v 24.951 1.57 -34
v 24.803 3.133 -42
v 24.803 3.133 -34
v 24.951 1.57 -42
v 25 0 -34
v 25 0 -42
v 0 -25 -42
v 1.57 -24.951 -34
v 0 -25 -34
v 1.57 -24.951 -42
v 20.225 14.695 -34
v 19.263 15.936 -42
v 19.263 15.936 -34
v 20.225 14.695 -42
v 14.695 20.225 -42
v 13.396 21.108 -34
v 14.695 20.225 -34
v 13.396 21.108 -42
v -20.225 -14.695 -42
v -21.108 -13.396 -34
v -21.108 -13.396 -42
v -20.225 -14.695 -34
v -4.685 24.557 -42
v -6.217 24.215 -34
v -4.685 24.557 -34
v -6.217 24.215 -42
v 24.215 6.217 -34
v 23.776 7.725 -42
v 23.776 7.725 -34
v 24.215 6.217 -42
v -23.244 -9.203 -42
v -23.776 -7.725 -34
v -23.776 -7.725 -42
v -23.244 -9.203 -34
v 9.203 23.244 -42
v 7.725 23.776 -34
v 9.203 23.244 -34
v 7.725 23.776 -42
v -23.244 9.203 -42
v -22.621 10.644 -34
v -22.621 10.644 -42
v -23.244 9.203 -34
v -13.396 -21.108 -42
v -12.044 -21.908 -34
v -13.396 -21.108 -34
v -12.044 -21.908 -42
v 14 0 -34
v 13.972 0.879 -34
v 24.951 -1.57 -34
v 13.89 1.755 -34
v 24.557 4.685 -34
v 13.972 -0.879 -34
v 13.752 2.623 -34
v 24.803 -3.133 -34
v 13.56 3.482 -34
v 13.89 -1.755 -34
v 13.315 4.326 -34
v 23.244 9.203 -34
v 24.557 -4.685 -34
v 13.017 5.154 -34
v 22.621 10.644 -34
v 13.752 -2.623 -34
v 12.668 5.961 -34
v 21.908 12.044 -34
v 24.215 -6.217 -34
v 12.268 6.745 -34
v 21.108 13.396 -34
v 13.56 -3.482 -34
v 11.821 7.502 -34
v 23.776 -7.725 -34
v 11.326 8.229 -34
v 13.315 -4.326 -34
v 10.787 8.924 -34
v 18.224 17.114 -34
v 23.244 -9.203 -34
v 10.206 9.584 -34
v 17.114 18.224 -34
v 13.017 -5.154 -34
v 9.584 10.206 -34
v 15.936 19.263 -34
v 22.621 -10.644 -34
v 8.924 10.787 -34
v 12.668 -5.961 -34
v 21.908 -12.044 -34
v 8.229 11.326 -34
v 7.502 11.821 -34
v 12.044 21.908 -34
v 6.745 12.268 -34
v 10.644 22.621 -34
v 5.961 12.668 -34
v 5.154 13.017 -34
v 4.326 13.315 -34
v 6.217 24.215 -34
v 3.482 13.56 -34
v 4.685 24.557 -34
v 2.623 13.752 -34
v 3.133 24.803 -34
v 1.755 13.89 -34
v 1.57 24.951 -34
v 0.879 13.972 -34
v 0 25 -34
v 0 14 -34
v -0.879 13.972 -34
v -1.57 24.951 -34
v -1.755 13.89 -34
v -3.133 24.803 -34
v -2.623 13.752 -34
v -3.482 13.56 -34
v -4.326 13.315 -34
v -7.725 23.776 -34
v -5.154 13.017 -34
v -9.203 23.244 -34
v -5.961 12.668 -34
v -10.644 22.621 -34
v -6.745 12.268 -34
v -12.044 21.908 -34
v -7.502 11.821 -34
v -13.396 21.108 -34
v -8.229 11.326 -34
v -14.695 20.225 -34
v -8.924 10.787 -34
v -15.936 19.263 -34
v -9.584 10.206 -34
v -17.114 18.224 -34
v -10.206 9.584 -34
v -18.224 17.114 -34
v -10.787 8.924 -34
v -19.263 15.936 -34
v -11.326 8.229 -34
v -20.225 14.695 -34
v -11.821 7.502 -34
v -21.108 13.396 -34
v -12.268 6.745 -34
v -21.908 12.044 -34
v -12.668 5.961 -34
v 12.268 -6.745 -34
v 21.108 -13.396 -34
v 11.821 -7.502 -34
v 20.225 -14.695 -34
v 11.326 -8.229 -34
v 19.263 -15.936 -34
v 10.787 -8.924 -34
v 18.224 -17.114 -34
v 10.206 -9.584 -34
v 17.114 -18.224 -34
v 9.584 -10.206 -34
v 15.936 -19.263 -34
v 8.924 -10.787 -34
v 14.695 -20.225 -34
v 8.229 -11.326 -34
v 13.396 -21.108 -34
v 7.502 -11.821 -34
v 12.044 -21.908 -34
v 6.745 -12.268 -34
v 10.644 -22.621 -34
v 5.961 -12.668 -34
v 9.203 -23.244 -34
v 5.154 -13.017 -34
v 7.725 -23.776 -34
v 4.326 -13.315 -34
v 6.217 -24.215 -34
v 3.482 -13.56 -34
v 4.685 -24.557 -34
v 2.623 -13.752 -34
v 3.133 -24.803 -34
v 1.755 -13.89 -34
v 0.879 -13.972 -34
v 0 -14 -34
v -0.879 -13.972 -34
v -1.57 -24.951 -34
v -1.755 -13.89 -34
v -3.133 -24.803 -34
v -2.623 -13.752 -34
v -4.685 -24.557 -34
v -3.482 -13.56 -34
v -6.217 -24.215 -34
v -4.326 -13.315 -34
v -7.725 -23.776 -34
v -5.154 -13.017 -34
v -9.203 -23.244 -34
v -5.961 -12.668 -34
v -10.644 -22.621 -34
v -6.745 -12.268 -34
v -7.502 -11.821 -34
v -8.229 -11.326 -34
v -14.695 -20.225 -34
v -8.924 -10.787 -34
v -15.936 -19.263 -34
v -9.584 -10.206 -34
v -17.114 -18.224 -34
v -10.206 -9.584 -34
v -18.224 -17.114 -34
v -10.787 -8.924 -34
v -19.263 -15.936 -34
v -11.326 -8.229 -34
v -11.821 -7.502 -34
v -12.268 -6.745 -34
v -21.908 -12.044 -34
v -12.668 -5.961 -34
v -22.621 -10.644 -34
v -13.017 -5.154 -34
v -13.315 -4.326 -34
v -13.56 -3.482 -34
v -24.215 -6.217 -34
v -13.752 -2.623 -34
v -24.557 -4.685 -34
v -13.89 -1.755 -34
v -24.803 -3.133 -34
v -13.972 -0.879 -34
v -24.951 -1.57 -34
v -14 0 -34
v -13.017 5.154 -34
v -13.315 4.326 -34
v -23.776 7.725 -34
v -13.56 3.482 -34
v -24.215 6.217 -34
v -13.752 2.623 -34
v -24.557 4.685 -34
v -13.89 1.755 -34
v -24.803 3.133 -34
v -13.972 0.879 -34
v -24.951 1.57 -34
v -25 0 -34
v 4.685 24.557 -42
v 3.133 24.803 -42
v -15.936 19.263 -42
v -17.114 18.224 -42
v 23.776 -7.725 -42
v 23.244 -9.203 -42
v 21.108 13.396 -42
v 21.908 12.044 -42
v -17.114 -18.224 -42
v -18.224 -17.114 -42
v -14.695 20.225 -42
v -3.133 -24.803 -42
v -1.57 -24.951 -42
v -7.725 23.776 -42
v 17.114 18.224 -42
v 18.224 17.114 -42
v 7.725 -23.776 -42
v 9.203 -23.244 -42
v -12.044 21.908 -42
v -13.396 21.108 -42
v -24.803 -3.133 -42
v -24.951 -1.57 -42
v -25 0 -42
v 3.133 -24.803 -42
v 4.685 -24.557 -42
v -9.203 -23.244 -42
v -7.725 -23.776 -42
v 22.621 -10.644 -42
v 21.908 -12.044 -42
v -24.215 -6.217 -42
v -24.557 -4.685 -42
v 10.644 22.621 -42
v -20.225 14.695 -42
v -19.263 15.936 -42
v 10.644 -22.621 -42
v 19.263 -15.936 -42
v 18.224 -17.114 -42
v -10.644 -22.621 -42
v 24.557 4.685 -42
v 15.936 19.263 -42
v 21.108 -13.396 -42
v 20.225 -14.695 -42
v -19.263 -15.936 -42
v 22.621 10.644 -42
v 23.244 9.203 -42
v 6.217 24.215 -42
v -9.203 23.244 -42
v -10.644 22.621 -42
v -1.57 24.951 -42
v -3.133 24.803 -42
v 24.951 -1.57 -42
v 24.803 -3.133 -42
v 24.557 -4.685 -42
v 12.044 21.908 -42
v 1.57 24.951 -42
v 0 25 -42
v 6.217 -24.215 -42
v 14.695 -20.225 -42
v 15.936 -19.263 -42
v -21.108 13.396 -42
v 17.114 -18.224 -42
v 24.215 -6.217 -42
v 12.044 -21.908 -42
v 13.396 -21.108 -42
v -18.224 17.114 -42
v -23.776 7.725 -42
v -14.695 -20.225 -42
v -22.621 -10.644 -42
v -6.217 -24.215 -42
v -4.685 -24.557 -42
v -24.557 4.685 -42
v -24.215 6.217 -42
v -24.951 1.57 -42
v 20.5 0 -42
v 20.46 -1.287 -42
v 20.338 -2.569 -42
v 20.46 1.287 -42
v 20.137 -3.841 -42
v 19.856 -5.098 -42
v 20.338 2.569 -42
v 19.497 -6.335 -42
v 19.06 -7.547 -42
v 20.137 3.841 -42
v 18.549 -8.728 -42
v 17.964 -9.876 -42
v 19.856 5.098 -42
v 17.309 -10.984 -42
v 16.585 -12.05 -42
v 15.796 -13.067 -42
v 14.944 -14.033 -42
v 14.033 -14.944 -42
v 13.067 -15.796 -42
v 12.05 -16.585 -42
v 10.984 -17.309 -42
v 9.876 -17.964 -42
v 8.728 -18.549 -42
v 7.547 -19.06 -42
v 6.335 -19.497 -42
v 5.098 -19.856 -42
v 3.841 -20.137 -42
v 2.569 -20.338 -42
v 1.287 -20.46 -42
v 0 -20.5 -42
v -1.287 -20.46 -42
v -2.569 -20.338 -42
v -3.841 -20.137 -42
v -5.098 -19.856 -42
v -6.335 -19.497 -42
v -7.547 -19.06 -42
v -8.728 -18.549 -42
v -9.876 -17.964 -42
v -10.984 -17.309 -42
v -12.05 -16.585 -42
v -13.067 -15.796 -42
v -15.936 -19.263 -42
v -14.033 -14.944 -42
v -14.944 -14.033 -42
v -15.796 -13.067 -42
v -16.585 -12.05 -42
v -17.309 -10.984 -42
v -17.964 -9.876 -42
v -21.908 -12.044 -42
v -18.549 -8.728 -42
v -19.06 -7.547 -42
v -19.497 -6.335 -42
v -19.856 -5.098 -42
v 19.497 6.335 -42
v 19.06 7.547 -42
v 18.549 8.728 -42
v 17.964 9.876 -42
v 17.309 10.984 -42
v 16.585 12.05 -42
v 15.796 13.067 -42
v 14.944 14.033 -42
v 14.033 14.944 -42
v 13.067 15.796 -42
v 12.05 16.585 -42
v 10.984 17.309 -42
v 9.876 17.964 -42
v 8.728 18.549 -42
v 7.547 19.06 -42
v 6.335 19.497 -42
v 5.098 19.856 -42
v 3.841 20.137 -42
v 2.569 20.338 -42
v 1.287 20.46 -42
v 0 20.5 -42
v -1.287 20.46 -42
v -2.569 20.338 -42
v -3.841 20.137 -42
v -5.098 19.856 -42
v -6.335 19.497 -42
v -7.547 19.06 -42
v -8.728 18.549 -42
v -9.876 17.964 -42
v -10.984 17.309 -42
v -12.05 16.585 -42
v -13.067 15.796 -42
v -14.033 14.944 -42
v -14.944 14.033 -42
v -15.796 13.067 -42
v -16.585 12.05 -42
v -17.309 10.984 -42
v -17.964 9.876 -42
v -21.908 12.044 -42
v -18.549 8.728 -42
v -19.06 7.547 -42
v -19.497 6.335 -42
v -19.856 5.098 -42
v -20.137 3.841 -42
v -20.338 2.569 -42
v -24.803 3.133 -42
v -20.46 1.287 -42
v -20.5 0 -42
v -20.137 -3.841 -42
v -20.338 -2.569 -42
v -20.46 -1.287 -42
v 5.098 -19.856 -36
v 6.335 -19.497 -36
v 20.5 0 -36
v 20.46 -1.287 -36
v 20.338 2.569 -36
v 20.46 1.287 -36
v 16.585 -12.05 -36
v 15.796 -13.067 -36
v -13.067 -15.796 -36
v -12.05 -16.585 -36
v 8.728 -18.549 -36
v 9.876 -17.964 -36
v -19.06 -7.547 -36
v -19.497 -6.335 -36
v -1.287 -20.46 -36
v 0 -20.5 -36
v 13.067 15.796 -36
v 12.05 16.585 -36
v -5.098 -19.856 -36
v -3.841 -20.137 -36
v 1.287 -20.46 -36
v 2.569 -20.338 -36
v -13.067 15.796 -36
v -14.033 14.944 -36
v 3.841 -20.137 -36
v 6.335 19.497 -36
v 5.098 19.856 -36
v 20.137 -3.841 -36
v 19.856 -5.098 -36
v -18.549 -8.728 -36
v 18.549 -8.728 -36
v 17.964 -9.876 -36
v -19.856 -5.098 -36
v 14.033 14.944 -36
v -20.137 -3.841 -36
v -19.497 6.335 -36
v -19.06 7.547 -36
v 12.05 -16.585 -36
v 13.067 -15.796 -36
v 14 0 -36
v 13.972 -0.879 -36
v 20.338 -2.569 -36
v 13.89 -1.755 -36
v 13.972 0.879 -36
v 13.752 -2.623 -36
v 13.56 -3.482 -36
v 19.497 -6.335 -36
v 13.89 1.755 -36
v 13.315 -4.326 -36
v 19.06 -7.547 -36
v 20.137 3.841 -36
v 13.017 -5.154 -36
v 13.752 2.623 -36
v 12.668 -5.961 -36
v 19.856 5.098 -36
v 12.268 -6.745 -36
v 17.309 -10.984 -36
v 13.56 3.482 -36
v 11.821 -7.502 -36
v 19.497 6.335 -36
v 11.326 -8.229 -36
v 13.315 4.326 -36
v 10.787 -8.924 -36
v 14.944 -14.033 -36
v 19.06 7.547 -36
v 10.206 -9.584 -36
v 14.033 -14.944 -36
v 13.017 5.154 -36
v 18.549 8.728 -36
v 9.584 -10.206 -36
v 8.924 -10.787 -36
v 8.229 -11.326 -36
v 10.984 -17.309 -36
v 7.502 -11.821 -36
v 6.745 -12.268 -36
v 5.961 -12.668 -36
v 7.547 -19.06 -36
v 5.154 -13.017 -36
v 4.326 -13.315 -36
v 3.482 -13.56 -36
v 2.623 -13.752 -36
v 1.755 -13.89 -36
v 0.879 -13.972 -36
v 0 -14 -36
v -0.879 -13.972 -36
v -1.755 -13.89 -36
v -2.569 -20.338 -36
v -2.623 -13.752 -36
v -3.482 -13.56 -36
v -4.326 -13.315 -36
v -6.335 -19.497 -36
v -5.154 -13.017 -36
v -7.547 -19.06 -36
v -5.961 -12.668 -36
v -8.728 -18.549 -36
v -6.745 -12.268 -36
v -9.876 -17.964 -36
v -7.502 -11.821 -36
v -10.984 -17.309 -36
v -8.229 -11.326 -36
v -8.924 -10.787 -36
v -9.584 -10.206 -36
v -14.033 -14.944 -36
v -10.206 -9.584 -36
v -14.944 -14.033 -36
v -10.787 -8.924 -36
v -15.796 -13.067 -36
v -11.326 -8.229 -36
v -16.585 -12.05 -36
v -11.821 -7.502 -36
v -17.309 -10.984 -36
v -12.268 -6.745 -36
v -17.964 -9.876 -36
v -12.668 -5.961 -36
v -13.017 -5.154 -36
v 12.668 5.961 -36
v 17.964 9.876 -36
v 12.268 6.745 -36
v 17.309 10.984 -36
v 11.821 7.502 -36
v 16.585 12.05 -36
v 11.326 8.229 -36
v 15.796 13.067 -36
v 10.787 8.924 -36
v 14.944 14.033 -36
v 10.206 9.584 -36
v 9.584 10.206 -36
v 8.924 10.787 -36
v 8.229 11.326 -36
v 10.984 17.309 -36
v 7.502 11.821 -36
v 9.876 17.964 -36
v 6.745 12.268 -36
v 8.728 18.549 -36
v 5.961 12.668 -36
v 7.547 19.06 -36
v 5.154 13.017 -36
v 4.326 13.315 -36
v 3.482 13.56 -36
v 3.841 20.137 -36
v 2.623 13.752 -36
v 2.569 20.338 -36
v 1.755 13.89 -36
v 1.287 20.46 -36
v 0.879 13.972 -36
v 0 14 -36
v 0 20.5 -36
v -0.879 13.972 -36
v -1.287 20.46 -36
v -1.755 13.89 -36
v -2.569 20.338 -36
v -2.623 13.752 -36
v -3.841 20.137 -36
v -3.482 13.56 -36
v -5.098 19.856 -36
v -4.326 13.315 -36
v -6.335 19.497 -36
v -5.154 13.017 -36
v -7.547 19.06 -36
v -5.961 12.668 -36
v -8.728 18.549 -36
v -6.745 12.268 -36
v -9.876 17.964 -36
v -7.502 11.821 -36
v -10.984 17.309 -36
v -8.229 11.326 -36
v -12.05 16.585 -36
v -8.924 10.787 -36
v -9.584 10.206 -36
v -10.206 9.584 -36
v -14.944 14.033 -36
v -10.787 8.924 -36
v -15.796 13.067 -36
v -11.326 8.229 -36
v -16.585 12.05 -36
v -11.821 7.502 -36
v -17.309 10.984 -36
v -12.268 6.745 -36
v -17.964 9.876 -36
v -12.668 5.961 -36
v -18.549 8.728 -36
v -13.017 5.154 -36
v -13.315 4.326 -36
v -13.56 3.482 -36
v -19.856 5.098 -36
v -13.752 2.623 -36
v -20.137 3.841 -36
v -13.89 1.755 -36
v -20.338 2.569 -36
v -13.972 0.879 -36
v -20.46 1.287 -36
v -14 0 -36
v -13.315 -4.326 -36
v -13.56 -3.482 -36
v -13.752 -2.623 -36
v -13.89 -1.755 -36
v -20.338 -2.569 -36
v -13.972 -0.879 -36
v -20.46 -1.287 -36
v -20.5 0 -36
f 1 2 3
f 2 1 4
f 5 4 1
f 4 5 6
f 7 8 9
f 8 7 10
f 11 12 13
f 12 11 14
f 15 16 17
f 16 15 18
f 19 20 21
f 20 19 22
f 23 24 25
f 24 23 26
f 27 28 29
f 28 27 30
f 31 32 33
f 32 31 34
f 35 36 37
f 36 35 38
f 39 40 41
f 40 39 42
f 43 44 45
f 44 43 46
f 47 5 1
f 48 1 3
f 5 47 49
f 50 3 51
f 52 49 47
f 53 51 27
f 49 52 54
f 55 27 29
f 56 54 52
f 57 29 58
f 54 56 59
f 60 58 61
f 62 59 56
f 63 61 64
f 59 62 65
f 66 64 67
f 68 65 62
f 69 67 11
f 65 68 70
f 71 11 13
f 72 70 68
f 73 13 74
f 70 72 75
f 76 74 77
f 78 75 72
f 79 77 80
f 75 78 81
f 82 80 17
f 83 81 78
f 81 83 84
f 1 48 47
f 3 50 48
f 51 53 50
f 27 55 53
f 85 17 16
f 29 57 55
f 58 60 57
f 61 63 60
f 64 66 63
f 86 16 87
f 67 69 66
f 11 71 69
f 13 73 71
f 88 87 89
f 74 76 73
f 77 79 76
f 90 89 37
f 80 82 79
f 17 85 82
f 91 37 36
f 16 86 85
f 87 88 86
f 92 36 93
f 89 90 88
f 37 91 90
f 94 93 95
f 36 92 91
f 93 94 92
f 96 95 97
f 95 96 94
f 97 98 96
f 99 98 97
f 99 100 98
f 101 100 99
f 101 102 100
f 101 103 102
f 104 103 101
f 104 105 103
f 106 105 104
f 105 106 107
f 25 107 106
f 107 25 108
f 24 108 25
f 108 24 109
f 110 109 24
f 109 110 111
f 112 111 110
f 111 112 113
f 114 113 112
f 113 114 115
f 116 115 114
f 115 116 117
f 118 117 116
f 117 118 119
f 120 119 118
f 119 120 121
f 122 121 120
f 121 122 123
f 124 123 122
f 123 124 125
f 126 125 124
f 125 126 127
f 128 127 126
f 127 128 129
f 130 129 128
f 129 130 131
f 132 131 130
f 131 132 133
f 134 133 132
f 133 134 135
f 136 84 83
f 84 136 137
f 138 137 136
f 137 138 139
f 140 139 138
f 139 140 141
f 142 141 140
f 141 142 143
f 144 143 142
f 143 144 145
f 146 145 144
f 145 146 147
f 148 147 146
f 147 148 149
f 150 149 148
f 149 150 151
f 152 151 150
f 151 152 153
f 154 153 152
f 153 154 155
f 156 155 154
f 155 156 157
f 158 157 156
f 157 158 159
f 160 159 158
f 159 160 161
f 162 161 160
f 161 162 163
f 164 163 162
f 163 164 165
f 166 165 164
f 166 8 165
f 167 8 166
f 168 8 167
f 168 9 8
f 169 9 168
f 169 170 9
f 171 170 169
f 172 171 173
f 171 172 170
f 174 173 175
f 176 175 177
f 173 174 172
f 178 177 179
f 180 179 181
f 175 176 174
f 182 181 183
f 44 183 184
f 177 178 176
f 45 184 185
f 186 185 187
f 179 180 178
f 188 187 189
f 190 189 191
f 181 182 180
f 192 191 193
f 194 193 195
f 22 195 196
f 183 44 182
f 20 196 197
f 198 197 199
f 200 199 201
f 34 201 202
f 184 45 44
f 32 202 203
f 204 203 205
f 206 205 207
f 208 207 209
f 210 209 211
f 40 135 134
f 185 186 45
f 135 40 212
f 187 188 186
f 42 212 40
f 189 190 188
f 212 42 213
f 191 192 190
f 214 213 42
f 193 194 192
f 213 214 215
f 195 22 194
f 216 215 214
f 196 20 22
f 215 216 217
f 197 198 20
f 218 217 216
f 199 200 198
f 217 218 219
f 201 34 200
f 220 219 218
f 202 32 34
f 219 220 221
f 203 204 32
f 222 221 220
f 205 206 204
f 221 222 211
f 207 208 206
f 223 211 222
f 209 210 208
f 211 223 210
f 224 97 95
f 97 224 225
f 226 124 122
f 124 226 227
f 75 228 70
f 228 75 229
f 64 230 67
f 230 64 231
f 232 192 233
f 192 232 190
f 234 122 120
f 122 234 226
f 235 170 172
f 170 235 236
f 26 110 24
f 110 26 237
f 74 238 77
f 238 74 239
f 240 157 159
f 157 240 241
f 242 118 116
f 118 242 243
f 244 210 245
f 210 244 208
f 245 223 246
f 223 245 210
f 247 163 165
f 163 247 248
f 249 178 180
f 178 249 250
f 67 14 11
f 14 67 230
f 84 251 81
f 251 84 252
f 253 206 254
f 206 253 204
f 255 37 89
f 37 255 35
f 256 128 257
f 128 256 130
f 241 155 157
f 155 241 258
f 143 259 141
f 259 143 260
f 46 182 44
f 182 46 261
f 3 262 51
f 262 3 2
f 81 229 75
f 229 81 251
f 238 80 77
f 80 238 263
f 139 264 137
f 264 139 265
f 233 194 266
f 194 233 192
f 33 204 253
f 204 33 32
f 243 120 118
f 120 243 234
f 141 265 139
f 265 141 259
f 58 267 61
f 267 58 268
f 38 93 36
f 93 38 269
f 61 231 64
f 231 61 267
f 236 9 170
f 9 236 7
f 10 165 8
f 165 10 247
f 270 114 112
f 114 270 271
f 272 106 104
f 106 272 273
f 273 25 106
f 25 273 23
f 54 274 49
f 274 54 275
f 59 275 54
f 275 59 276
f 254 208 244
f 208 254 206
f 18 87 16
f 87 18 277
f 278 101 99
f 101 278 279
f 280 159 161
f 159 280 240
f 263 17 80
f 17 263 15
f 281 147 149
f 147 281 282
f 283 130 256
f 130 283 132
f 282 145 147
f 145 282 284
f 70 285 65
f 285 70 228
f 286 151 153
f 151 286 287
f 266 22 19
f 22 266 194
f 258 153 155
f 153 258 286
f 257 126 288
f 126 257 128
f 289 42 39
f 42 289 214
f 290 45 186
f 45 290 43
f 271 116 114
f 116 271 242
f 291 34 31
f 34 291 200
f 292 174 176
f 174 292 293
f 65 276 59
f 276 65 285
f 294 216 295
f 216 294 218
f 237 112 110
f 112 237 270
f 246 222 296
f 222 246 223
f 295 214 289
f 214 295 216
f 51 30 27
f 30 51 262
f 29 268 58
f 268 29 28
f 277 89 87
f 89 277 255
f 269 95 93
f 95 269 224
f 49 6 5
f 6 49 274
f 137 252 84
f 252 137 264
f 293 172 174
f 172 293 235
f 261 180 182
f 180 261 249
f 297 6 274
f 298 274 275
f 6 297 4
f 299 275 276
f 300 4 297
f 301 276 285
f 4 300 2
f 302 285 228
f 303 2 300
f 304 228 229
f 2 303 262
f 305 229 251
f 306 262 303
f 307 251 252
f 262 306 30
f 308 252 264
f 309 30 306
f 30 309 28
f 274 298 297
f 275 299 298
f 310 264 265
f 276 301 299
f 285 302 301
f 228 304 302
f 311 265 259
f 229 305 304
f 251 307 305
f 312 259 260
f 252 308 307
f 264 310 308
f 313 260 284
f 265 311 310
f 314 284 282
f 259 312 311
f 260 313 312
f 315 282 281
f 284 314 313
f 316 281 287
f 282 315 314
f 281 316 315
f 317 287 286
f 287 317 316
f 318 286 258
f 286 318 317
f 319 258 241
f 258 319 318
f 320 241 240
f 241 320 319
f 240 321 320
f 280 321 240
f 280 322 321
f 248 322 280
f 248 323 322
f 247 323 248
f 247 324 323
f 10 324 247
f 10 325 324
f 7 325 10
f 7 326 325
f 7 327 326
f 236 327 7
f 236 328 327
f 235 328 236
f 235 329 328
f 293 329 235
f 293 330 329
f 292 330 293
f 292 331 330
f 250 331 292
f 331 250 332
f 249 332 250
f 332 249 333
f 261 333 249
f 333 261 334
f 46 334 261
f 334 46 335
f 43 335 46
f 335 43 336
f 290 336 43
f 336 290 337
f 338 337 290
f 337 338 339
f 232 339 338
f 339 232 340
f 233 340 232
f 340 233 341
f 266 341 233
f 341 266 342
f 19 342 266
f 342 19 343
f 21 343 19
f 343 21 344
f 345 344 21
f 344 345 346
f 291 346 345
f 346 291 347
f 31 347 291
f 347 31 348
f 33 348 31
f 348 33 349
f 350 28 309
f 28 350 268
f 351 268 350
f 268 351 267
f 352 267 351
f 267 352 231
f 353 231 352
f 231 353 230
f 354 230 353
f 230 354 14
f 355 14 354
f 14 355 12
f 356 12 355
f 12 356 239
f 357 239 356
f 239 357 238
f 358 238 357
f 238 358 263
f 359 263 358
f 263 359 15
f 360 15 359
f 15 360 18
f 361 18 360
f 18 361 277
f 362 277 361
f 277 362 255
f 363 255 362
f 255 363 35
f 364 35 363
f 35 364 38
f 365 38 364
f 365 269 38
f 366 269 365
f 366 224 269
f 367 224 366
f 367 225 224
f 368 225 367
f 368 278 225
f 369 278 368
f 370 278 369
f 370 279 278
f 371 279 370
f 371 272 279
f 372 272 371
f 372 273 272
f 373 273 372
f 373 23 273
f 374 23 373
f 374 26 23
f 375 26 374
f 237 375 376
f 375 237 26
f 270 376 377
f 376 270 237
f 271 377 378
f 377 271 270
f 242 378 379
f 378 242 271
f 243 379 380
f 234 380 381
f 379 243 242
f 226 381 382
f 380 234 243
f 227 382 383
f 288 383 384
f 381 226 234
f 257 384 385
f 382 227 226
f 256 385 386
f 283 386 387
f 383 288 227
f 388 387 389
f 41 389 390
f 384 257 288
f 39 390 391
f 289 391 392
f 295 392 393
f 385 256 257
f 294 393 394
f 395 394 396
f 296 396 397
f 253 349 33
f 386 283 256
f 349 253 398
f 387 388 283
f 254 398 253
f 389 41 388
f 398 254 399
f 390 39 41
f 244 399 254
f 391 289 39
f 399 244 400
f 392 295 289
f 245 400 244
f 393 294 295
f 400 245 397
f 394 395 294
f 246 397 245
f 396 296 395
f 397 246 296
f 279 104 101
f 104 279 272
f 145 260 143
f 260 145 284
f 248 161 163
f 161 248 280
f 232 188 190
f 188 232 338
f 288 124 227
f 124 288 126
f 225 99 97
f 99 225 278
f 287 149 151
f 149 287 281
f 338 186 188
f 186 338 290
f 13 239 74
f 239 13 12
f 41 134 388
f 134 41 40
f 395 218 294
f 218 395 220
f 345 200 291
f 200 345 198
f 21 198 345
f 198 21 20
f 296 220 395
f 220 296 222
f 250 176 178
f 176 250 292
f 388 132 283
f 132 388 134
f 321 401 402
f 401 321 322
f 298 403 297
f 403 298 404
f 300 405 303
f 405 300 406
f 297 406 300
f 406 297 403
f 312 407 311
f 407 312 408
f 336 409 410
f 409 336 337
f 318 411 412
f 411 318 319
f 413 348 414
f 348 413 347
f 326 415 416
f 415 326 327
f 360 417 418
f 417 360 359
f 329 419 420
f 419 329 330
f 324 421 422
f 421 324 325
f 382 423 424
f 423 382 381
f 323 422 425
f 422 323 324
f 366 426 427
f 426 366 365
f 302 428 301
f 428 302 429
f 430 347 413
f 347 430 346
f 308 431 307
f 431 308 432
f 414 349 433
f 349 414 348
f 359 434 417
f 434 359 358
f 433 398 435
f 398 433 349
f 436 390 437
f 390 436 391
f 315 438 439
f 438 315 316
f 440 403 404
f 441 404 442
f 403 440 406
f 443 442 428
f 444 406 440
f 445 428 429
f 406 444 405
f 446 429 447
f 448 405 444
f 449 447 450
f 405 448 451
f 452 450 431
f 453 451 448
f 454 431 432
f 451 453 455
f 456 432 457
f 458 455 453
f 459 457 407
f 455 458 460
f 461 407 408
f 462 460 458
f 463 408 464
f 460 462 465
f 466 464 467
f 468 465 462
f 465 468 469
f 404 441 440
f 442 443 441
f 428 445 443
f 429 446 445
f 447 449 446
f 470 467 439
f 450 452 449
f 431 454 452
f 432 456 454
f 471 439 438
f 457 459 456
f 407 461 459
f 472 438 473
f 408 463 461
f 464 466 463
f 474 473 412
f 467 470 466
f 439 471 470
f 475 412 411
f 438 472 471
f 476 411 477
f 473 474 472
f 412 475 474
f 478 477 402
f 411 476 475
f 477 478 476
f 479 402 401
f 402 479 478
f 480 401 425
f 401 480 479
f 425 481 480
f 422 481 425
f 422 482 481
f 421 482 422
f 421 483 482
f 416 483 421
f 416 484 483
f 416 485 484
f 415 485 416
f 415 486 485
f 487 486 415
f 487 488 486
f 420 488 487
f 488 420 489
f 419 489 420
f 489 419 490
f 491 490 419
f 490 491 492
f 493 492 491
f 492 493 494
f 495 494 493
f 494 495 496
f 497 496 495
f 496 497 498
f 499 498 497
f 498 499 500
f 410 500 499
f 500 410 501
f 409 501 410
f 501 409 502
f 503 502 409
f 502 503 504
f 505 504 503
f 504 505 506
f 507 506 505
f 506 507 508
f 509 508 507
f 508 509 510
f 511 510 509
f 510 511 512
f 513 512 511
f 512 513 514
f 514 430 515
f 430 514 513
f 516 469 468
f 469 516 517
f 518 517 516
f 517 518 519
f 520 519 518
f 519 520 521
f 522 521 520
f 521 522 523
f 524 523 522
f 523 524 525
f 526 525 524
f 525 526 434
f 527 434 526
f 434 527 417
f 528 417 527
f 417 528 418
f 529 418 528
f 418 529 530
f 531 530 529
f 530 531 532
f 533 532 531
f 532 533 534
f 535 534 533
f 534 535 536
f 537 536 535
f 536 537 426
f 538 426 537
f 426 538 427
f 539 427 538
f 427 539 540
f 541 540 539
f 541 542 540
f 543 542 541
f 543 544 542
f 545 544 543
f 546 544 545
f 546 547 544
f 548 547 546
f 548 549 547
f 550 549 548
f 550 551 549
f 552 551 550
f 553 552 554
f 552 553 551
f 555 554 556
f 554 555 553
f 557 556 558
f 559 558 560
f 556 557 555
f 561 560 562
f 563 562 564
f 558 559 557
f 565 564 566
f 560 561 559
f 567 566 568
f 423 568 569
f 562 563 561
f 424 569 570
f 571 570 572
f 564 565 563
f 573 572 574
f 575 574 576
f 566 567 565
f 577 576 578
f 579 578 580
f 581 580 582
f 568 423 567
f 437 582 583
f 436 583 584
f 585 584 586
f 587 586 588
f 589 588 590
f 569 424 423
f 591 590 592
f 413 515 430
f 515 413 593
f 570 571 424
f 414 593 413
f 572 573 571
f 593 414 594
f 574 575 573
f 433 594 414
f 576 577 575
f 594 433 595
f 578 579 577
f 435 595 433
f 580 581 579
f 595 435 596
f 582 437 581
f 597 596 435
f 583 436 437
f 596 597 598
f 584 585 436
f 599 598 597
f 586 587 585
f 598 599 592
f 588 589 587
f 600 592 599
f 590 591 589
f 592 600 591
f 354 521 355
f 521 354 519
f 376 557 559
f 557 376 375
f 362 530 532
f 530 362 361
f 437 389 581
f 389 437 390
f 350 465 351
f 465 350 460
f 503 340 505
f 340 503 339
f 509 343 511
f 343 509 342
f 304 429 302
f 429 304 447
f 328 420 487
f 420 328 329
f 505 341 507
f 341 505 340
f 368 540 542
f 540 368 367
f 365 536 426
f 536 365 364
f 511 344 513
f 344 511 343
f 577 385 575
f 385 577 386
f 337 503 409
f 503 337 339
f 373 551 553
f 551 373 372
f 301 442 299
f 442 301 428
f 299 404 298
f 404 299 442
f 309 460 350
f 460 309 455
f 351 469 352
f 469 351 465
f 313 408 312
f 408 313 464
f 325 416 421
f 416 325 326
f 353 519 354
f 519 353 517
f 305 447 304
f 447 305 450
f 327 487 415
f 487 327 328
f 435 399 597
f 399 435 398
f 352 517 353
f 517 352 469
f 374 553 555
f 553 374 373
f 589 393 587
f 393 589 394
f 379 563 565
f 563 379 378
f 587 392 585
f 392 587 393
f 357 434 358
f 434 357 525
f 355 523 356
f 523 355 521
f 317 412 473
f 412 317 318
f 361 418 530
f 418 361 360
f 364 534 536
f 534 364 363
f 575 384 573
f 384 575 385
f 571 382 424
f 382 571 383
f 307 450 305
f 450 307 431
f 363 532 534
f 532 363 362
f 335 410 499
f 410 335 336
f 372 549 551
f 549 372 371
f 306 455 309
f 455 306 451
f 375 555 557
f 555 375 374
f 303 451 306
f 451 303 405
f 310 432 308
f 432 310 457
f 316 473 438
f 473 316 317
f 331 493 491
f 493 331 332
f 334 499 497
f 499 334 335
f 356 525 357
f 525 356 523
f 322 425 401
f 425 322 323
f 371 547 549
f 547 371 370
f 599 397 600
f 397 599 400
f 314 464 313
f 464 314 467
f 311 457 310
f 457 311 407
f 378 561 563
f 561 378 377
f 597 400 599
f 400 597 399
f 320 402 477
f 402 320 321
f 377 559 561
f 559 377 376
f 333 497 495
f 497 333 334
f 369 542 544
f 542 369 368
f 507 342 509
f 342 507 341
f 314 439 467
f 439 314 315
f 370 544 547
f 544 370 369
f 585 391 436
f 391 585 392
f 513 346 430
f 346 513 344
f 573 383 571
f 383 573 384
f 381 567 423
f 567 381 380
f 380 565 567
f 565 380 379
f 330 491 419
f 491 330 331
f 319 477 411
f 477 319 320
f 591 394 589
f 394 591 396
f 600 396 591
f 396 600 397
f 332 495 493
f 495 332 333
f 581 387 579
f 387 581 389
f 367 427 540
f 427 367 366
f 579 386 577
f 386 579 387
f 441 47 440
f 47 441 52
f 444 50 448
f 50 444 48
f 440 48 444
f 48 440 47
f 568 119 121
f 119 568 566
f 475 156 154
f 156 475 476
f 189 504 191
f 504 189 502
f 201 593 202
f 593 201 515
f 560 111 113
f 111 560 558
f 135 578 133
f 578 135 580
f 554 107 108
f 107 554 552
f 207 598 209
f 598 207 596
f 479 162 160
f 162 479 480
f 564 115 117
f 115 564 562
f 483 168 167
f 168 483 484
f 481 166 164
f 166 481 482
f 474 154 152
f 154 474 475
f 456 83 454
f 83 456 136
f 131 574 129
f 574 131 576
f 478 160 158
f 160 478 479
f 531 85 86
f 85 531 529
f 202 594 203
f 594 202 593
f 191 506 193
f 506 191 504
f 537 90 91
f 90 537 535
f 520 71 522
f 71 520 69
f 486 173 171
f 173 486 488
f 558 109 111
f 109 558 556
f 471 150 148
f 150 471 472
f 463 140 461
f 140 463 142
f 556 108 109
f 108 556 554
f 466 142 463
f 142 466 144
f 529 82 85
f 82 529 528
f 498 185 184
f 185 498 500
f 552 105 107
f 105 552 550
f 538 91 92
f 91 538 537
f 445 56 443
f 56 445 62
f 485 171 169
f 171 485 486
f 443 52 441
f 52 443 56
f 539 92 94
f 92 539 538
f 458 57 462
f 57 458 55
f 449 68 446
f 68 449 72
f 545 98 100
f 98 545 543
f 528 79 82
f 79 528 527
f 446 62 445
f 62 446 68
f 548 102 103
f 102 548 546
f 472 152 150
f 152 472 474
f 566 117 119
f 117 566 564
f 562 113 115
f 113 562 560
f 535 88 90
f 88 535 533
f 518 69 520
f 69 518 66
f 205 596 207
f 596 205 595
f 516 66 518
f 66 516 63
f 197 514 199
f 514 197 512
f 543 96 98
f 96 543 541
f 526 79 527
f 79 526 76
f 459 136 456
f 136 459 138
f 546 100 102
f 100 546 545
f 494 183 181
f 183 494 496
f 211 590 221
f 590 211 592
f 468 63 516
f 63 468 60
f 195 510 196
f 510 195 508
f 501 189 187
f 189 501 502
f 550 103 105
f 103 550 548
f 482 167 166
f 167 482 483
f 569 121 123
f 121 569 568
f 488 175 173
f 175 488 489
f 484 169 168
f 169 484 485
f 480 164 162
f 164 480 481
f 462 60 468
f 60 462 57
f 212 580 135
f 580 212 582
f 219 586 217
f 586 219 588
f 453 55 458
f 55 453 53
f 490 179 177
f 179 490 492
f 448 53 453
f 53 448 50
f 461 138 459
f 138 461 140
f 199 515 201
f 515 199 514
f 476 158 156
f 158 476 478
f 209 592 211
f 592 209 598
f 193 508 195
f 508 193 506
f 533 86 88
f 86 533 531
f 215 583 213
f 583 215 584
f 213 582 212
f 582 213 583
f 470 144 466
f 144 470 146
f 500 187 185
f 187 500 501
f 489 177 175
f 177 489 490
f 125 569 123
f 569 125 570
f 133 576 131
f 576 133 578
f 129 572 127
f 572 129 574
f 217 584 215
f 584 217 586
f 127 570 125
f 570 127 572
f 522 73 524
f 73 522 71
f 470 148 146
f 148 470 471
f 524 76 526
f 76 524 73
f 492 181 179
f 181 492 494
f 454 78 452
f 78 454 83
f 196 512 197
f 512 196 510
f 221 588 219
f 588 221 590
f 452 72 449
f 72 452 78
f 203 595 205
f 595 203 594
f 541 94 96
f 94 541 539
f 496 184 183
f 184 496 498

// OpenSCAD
//Fixings
M5=5.5;
M4=4.5;
M3=3.5;
M2=2.5;
M3INSERT=3.7;
M2INSERT=3.4;


//Blade
BladeDiam=23;//24;
BladeDiamTrue=19.5;
BladeLen=100; //Debug only
BladeThick=3;

CapCollar=2;

//Pico
PicoWid=21;
PicoLen=64;
PicoDep=19;

//PIZ
PIZWid=34;
PIZLen=72;
PIZDep=19;
PCBGrid=2.54;

//Stem
StemLen=50;
StemCollar=0;//5;
StemSegLen=6;
StemSegMaxDiam=50;
StemSegStep=6;

//Grip
GripLen=160; //Max print size is 170
GripDiam=40;//45;
GripOverlap=12;

//Pummel
PummelDiam=GripDiam+10;
PummelIntDiam = GripDiam + 1;
PummelLen=20;
PummelOverlap=5;
PowerWid=11.5;
PowerLen=9;


//PCB
PCBWidth=30.5;
PCBLen=135;
PCBBRy=3.9;
PCBBRx=7.35;
PCBBLx=16.51;//15.51;
PCBBLy=9.4;
PCBTRx=0;
PCBTRy=90.79;
PCBLEDy=12.5;
PCBLEDx=10;
PCBLEDz=5;
PCBSwitchD=5 ;
PCBSwitchY=23.5;
PCBSwitchX=7.6;
PCBSwitchZ=15;//12;
PCBSwitchL=20;
PCBCapX=12;
PCBCapY=114;
PCBCapL=20;
PCBCapZ=PCBCapL/2;
PCBCapD=10.2;
PCBOffz=10;
PCBOffy=-10;



THICK=2;

$fn=100;


/*
Blade();
Pico();
PIZ();
*/
//Blade();
//PCB();
//PIR();

    
//BladeCap();

//Stem();
//GripBack();
//PummelInt();
//Pummel();
//translate([5,10,0]) GripFront();
//GripFront();

//Guard();
GuardShort();

//MountBottom();
//MountTop();



//Test print
/*
difference(){
    GripBack();
    translate([0,0,GripLen*(-0.85)])
        cube([PummelDiam, PummelDiam, GripLen], center=true);
}
*/




module Blade(){
    color("blue")
    translate([0,0,BladeLen/2]){
        difference(){
            cylinder(d=BladeDiam, h=BladeLen, center=true);
            cylinder(d=BladeDiam-(BladeThick*2), h=BladeLen+10, center=true);
        }
        
    }
}

module BladeCap(){
    inner = BladeDiamTrue-(BladeThick);
    translate([0,0,BladeLen]){
        //Half hollow Sphere
        difference(){
            sphere(d=BladeDiamTrue, $fn=100);
            sphere(d=inner);
            translate([0,0,BladeDiamTrue/(-2)]){
                cube([BladeDiamTrue+10, BladeDiamTrue+10, BladeDiamTrue], center=true);
            }
            
            
           for (x=[0:30:360]){
               rotate([0,0,x]){
                   rotate([0,65,0])
                      cylinder(d=M3, h=BladeThick*10, center=true);
               }
           }
  
            
        }
        //Connection collar
        /*
        difference(){
            cylinder(d=inner, h=CapCollar*2, center=true);
            cylinder(d=inner-(THICK*2), h=CapCollar*4, center=true);
        }
        */
    }
}

module Stem(){
    //Inner Tube
    translate([0,0,StemLen/(-2)]){
        difference(){
            cylinder(d=BladeDiam+(THICK*2), h=StemLen, center=true);
            cylinder(d=BladeDiam-(THICK), h=StemLen+10, center=true);
            translate([0,0,(StemLen/2)-(StemCollar/2)]){
                cylinder(d=BladeDiam, h=StemCollar, center=true);
            }
            
            //Coupline
            CoupZ=StemLen/(-2) + (GripOverlap/2);
            translate([0, 0, CoupZ]){
                //Hole
                rotate([90,0,0]){
                    cylinder(d=M2, h=BladeDiam+(THICK*4), center=true);
                }
                //Loose top
                translate([0, (BladeDiam+(THICK*2))/2, THICK*(-1)]){
                    //cube([BladeDiam+(THICK*2), BladeDiam+(THICK*2), GripOverlap-THICK], center=true);
                    cube([BladeDiam/2, BladeDiam+(THICK*2), GripOverlap-THICK], center=true);
                }
            }
        }
    }
    //Steps
    difference(){
        translate([0,0,StemSegLen/2]){
            for(i=[0:4]){
                translate([0, 0, (StemSegLen*(i+1))/(-1)]){
                    cylinder(d=StemSegMaxDiam-(StemSegStep*i), h=StemSegLen, center=true);
                }
            }
        }
        //Hole
        translate([0,0,StemLen/(-2)]){
            cylinder(d=BladeDiam, h=StemLen+10, center=true);
        }   
    }
}

function picoZ()=(StemLen + ((PicoLen+(THICK*4)) / (2)))* (-1) ;

module Pico(){
    z=picoZ();
    translate([0,0,z]){
        color("lightgrey"){
            cube([PicoWid, PicoDep, PicoLen], center=true);
        }
    }
}

module PIZ(){
    z=picoZ() - PIZLen ;
    translate([0,0,z]){
        color("lightGreen"){
            cube([PIZWid, PIZDep, PIZLen], center=true);
        }
    }
}


module GripBack(){
    difference(){
        GripTube();
        rotate([0,0,-30]){
            translate([0,GripDiam/2, gripTubeZ()-THICK]){
                cube([GripDiam+10,GripDiam,GripLen ], center=true);
            }
        }
    }
    stemCoupling();
}

module GripFront(){
    intersection(){
        difference(){
            GripTube();
            translate([0,0,gripTubeZ()]){
                cylinder(d=GripDiam - (THICK*2), h=GripLen+10, center=true);
            }
            rotate([0, 0, -30]){
                translate([0,GripDiam/(-2), gripTubeZ()]){
                    cube([GripDiam+10,GripDiam,GripLen+10 ], center=true);
                }
            }
            
            /*
            //Switch hole
            translate([0,PCBOffy,gripTubeZ()]){
                for(i=[-2:1:2]){
                    translate([PCBWidth/-2, PCBSwitchZ + i, PCBLen/-2-5.5+PCBSwitchY]){
                        rotate([0,90,0]){
                            cylinder(d=PCBSwitchD+1,h=20,center=true);
                        }
                    }
                }
            }
            */
        }
        
        rotate([0, 0, -30]){
            translate([0,GripDiam/2, gripTubeZ()-THICK]){
                cube([GripDiam+10,GripDiam,GripLen ], center=true);
            }
        }
    }
}
    
function gripTubeZ() = (StemLen + GripLen/2 - GripOverlap) *( -1);
module GripTube(){
    z=gripTubeZ();
    translate([0,0,z]){
        difference(){
            cylinder(d=GripDiam, h=GripLen, center=true);
            translate([0,0,THICK*(-1)]){
                cylinder(d=GripDiam - (THICK*2), h=GripLen, center=true);
            }
            //Stem Hole
            cylinder(d=BladeDiam+(THICK*2.5), h=GripLen+10, center=true);
            
            //LED hole
            translate([PCBWidth/-2, PCBLEDz*(-1), PCBLen/-2-9.5+PCBLEDy]){
                rotate([0,90,0]){
                    cylinder(d=3,h=20,center=true);
                }
            }
            
            //Switch hole
            translate([PCBWidth/-2, PCBSwitchZ+PCBOffy, PCBLen/-2-7+PCBSwitchY]){
                for(i=[-2:1:2]){
                    translate([0, i, 0]){
                        rotate([0,90,0]){
                            cylinder(d=PCBSwitchD+1.5,h=20,center=true);
                        }
                    }
                }
            }
            
            //PowerHole
            translate([PCBWidth/-2, -4.5, PCBLen/2-5]){
                translate([-5, 0, PowerSocketY*(-1)]){
                    rotate([90,0,0])
                        PowerSocketHole();
                }
            }
        }
    }
    
    stemCoupling();
    
    
    //PCB Mount
    translate([0,0,z-(GripOverlap/2)]){
        difference(){
            //PCB plate
            cylinder(d=GripDiam, h=GripLen-(GripOverlap), center=true);
            cube([GripDiam, PIZDep, GripLen], center=true);
            translate([0,GripDiam/2,0]){
                cube([GripDiam+10, GripDiam, GripLen+10], center=true);
            }
            translate([0,0,PCBLen/(-2)-5]){
                cube([GripDiam, GripDiam, 10], center=true);
            }
            
            //Mounting Holes
            translate([PCBWidth/-2,0, PCBLen/-2-1.5]){
                translate([PCBBRx,0,PCBBRy]){
                    rotate([90,0,0]){
                        cylinder(d=M2INSERT, h=BladeDiam+(THICK*4), center=true);
                    }
                    translate([PCBBLx,0, PCBBLy]){
                        rotate([90,0,0]){
                            cylinder(d=M2INSERT, h=BladeDiam+(THICK*4), center=true);
                        }
                    }
                    translate([PCBTRx,0, PCBTRy]){
                       rotate([90,0,0]){
                            cylinder(d=M2INSERT, h=BladeDiam+(THICK*4), center=true);
                        }
                    }
                }
            }
            
            
            /*
            //PCB Weight Holes
            pcbCountX=GripDiam/PCBGrid/2-2;
            pcbCountY=(GripLen-GripOverlap)/PCBGrid/2;
            for (y=[0:5:pcbCountY]){
                for (j=[-1,1]){
                    translate([0, 0, y*j*PCBGrid]){
                        for (x=[0:3:pcbCountX]){
                            for (i=[-1,1]){
                                translate([x*i*PCBGrid,0,0]){
                                    rotate([90,0,0]){
                                        cylinder(d=M2INSERT, h=BladeDiam+(THICK*4), center=true);
                                    }
                                }
                            }
                        }
                    }
                }
            }
            */
            
        }
    }
}


module stemCoupling(){
    //Coupling for Stem
    translate([0,0,gripTubeZ() + GripLen/2 - GripOverlap/2]){
        difference(){
            cylinder(d=BladeDiam+(THICK*6.5), h=GripOverlap, center=true);
            cylinder(d=BladeDiam+(THICK*2.5), h=GripOverlap+10, center=true);
            //Bottom half only
            //translate([0,BladeDiam/2,0]){
            //    cube([BladeDiam+(THICK*10),BladeDiam+(THICK*4),GripOverlap+10], center=true);
            //}
            
            //Fixing
            rotate([90,0,0]){
                cylinder(d=M2INSERT, h=BladeDiam+(THICK*4), center=true);
            }
            
            //Opening
            translate([0,BladeDiam,0]){
                cube([BladeDiam/2,BladeDiam,BladeDiam], center=true);
            }
        }
    }
}


module Pummel(){
    z=gripTubeZ()-GripLen/2 - PummelLen/2 + PummelOverlap;
    translate([0,0,z]){
        difference(){
            cylinder(d=PummelDiam, h=PummelLen, center=true);
            translate([0,0,THICK]){
                difference(){
                    cylinder(d=PummelIntDiam, h=PummelLen, center=true);
                    translate([0,0,THICK * (-1.5)])
                        cylinder(d=THICK*3, h=PummelLen - THICK *3, center=true);
                }

            }
            cylinder(d=M2, h=PummelLen*2, center=true);
            
            //PIR
            translate([PIRX,PummelDiam/2-3,0]){
                sphere(d=PIRD+0.3);
                translate([0,THICK*(-3),0])
                    rotate([90,0,0]){
                        cylinder(d=PIRD+0.3, h=THICK*6, center=true);
                    }
            }
        }
    }
}







module PCB(){
    translate([0,PCBOffy, (StemLen+ PCBLen/2 + PCBOffz)*(-1)+2.2])
    {
        rotate([-90,180,0]){  
            PCBx();
        }
    }
}

module PCBx(){
    difference(){
        color([0.2,1,0.5])
            cube([PCBWidth, PCBLen, THICK], center=true);            
        PCBholes();
    }
    translate([PCBWidth/2, PCBLen/-2, 0]){
        //LED
        translate([PCBLEDx*(-1), PCBLEDy, PCBLEDz]){
            rotate([0,90,0]){
                color([0,0,1])
                    cylinder(d=PCBLEDz, h=PCBLEDz, center=true);
            }
        }
        //Switch
        translate([PCBSwitchX*(-1)+(PCBSwitchL/2), PCBSwitchY, PCBSwitchZ]){
            rotate([0,90,0]){
                color([0.1,0.1,0.1])
                    cylinder(d=PCBSwitchD, h=PCBSwitchL, center=true);
            }
        }
        //CAP
        translate([PCBCapX*(-1), PCBCapY, PCBCapZ]){
            color([0,0,0])
                cylinder(d=PCBCapD, h=PCBCapL, center=true);
        }
        
        
    }
    
    PowerSocket();
}

module PCBholes(){
    translate([PCBWidth/2, PCBLen/-2, 0]){
        translate([PCBBRx*(-1),PCBBRy,0]){
            cylinder(d=M2, h=THICK*2, center=true);
            translate([PCBBLx*(-1),PCBBLy,0]){
                cylinder(d=M2, h=THICK*2, center=true);
            }
            translate([PCBTRx*(-1),PCBTRy,0]){
                cylinder(d=M2, h=THICK*2, center=true);
            }
        }
    }
}


PowerSocketD=8.6;
PowerSocketX=12;
PowerSocketY=46;
PowerSocketZ=12;//5.5;
PowerSocketHol=16;//14.9;

module PowerSocket(){
    color([0,0,0]){
        translate([PCBWidth/2, PCBLen/2+2, PowerSocketZ-1]){
            translate([0,PowerSocketY*(-1),0]){
                translate([0,PowerSocketD/4,0]){
                    rotate([0,90,0]){
                        cylinder(d=PowerSocketD+0.3, h=PowerSocketX, center=true);
                    }
                }
                translate([0,PowerSocketD/-4,0]){
                    cube([PowerSocketX, PowerSocketD+0.3, PowerSocketD], center=true);
                }
            }
        }
    }
}

module PowerSocketHole(){
    translate([0,0,PowerSocketZ/(-2)]){    
        translate([0,PowerSocketD/4,0]){
            rotate([0,90,0]){
                cylinder(d=PowerSocketD+0.3, h=PowerSocketX, center=true);
            }
        }
        translate([0,PowerSocketD/-4,0]){
            cube([PowerSocketX, PowerSocketD+0.5, PowerSocketD+0.5], center=true);
            //translate([0,0,-3])
            //    cube([PowerSocketX, PowerSocketD+0.3, PowerSocketD], center=true);
        }
    }
    for (i=[2,-2]){
        translate([0,PowerSocketHol/i, PowerSocketZ/(-2)]){
            rotate([0,90,0]){
                cylinder(d=M2, h=PowerSocketX, center=true);
            }
        }
    }
}



module PummelInt(){
    z=gripTubeZ()+(GripLen+THICK)/-2;
    translate([0,0,z]){
        difference(){
            union(){
                cylinder(d=GripDiam, h=THICK, center=true);
                translate([0,0, THICK])
                    cylinder(d=GripDiam-(THICK*2.3), h=THICK, center=true);
            }
            
            //Insert
            cylinder(d=M2INSERT,h=THICK*4, center=true);
            
            //Gap for Cables
            gapD = GripDiam - THICK * 6;
            for (i=[0,180]){
                rotate([0,0,i]){
                    difference(){
                        cylinder(d=gapD, h=THICK*4, center=true);

                        translate([0, THICK * 5, 0]){
                            cube([gapD, gapD, gapD], center=true);
                        }
                    }
                }
            }
            
        }
    }
}


PIRD=12.9;
PIRW=10.1;
PIRL=30;
PIRX=5;

module PIR(){
    color([0.5,0.5,0.5]){
        z=gripTubeZ()+(GripLen+THICK)/-2-PummelLen/4;
        translate([PIRX,PummelDiam/2-THICK*2,z]){
            difference(){
                sphere(d=PIRD); 
                translate([0,PIRD/-2,0]){
                    cube([PIRD,PIRD,PIRD], center=true);
                }
            }
            translate([0,(PIRL)/-2,0])
                cube([THICK,PIRL,PIRW], center=true);
        }
    }
    
}

GuardLen=THICK*4;
GuardDiam = PummelDiam;
GuardIntDiam = PummelIntDiam;
GuardWid = 15;


module Guard(){
    z=gripTubeZ()+GripLen/2;
    translate([0,0,z]){
        difference(){
            union(){
                cylinder(d=GuardDiam, h=GuardLen, center=true);
                translate([0,THICK*2,GripLen/-2+THICK*4])
                    GuardFly();
            }
            translate([0,0,THICK*(-1)]){
                cylinder(d=GuardIntDiam, h=GuardLen, center=true);
            }   
            cylinder(d=BladeDiam+(THICK*2.5), h=GuardLen+10, center=true);
        }
        
    }
}

module GuardFlyOld(){
    intersection(){
        translate([GripLen*2/-3-THICK*7,0,0])
            difference(){ 
                sphere(d=GripLen*2);
                sphere(d=GripLen*2-THICK*2);
                
            }
        //translate([GripDiam/2,GuardDiam/-4,GripLen/-2])
        //    cube([GuardWid*2,GuardWid,GripLen]);
            
        translate([GripDiam-THICK*4,(GuardWid/-4),THICK*(-3)]){
            intersection(){
                scale([2,1,360])
                    sphere(d=GuardWid);
                cube([GuardWid*2,GuardWid,GripLen], center=true);
            }
        }
    }
    
}

module GuardFly(){
    intersection(){
        translate([0,0,0])
            scale([1,1,(GripLen/PummelDiam)*1.7]){ 
                difference(){
               
                    sphere(d=PummelDiam);
                    sphere(d=PummelDiam-THICK*3);
               }
                
            }

        rotate([0,0,90]){
            translate([THICK*6,(GuardWid/-4),THICK*(-3)]){
                intersection(){
                    scale([2,1,360])
                        sphere(d=GuardWid);
                    cube([GuardWid*2,GuardWid,GripLen], center=true);
                }
            }
        }
        
    }
    
}


module GuardShort(){
    z=gripTubeZ()+GripLen/2;
    translate([0,0,z]){
        difference(){
            union(){
                cylinder(d=GuardDiam, h=GuardLen, center=true);;
            }
            translate([0,0,THICK*(-1)]){
                cylinder(d=GuardIntDiam, h=GuardLen, center=true);
            }   
            cylinder(d=BladeDiam+(THICK*2.5), h=GuardLen+10, center=true);
        }
        
    }
}


MountWid=50;
MountDep=50;
MountLen=40;

module MountBottom(){
    translate([0,0,StemLen/-1+10]){
        difference(){
            translate([0,MountDep/-10,0]){
                cube([MountWid, MountDep, MountLen], center=true);
                translate([0,MountDep/2,MountLen/2-MountDep/20]){
                    rotate([0,90,0])
                        cylinder(d=MountDep/10, h=MountWid, center=true);
                }
            }
            //Hole
            cylinder(d=StemSegMaxDiam-(StemSegStep*3)+1, h=MountLen*2, center=true);
            //Inside
            translate([0,MountDep/-10,THICK*(-1)])
                cube([MountWid-(THICK*2), MountDep-THICK*3, MountLen], center=true);
            //Slot
            translate([0,MountDep/2,0])
                cube([StemSegMaxDiam-(StemSegStep*4)+1 ,MountDep, MountLen*2], center=true);
            //Mount Holes
            rotate([90,0,0]){
                for (i=[-7.5,7.5]){
                    translate([i,i,0])
                        cylinder(d=M4, h=MountDep*2, center=true);
                }
            }
            
            //Sides
            translate([0,MountDep/-10,MountDep/-10]){
                rotate([0,90,0]){
                    translate([MountDep/2, MountWid/2, 0])
                        cylinder(d=MountWid*1.8, h=MountWid*2, center=true);
                }
            }
        }
    }
}


module MountTop(){
    translate([0,0,100]){
        difference(){
            translate([0,MountDep/-10,0]){
                cube([MountWid, MountDep, MountLen], center=true);
                translate([0,MountDep/2,MountLen/-2+MountDep/20]){
                    rotate([0,90,0])
                        cylinder(d=MountDep/10, h=MountWid, center=true);
                }
            }
            //Hole
            cylinder(d=BladeDiam+1, h=MountLen*2, center=true);
            //Inside
            translate([0,MountDep/-10,THICK])
                cube([MountWid-(THICK*2), MountDep-THICK*3, MountLen], center=true);
           
            //Mount Holes
            rotate([90,0,0]){
                for (i=[-7.5,7.5]){
                    translate([i,i,0])
                        cylinder(d=M4, h=MountDep*2, center=true);
                }
            }
            
            //Sides
            translate([0,MountDep/-7, MountWid*1.1]){
                rotate([0,90,0]){
                    translate([MountDep/2, MountWid/2, 0])
                        cylinder(d=MountWid*1.8, h=MountWid*2, center=true);
                }
            }
            
        }
    }
}
